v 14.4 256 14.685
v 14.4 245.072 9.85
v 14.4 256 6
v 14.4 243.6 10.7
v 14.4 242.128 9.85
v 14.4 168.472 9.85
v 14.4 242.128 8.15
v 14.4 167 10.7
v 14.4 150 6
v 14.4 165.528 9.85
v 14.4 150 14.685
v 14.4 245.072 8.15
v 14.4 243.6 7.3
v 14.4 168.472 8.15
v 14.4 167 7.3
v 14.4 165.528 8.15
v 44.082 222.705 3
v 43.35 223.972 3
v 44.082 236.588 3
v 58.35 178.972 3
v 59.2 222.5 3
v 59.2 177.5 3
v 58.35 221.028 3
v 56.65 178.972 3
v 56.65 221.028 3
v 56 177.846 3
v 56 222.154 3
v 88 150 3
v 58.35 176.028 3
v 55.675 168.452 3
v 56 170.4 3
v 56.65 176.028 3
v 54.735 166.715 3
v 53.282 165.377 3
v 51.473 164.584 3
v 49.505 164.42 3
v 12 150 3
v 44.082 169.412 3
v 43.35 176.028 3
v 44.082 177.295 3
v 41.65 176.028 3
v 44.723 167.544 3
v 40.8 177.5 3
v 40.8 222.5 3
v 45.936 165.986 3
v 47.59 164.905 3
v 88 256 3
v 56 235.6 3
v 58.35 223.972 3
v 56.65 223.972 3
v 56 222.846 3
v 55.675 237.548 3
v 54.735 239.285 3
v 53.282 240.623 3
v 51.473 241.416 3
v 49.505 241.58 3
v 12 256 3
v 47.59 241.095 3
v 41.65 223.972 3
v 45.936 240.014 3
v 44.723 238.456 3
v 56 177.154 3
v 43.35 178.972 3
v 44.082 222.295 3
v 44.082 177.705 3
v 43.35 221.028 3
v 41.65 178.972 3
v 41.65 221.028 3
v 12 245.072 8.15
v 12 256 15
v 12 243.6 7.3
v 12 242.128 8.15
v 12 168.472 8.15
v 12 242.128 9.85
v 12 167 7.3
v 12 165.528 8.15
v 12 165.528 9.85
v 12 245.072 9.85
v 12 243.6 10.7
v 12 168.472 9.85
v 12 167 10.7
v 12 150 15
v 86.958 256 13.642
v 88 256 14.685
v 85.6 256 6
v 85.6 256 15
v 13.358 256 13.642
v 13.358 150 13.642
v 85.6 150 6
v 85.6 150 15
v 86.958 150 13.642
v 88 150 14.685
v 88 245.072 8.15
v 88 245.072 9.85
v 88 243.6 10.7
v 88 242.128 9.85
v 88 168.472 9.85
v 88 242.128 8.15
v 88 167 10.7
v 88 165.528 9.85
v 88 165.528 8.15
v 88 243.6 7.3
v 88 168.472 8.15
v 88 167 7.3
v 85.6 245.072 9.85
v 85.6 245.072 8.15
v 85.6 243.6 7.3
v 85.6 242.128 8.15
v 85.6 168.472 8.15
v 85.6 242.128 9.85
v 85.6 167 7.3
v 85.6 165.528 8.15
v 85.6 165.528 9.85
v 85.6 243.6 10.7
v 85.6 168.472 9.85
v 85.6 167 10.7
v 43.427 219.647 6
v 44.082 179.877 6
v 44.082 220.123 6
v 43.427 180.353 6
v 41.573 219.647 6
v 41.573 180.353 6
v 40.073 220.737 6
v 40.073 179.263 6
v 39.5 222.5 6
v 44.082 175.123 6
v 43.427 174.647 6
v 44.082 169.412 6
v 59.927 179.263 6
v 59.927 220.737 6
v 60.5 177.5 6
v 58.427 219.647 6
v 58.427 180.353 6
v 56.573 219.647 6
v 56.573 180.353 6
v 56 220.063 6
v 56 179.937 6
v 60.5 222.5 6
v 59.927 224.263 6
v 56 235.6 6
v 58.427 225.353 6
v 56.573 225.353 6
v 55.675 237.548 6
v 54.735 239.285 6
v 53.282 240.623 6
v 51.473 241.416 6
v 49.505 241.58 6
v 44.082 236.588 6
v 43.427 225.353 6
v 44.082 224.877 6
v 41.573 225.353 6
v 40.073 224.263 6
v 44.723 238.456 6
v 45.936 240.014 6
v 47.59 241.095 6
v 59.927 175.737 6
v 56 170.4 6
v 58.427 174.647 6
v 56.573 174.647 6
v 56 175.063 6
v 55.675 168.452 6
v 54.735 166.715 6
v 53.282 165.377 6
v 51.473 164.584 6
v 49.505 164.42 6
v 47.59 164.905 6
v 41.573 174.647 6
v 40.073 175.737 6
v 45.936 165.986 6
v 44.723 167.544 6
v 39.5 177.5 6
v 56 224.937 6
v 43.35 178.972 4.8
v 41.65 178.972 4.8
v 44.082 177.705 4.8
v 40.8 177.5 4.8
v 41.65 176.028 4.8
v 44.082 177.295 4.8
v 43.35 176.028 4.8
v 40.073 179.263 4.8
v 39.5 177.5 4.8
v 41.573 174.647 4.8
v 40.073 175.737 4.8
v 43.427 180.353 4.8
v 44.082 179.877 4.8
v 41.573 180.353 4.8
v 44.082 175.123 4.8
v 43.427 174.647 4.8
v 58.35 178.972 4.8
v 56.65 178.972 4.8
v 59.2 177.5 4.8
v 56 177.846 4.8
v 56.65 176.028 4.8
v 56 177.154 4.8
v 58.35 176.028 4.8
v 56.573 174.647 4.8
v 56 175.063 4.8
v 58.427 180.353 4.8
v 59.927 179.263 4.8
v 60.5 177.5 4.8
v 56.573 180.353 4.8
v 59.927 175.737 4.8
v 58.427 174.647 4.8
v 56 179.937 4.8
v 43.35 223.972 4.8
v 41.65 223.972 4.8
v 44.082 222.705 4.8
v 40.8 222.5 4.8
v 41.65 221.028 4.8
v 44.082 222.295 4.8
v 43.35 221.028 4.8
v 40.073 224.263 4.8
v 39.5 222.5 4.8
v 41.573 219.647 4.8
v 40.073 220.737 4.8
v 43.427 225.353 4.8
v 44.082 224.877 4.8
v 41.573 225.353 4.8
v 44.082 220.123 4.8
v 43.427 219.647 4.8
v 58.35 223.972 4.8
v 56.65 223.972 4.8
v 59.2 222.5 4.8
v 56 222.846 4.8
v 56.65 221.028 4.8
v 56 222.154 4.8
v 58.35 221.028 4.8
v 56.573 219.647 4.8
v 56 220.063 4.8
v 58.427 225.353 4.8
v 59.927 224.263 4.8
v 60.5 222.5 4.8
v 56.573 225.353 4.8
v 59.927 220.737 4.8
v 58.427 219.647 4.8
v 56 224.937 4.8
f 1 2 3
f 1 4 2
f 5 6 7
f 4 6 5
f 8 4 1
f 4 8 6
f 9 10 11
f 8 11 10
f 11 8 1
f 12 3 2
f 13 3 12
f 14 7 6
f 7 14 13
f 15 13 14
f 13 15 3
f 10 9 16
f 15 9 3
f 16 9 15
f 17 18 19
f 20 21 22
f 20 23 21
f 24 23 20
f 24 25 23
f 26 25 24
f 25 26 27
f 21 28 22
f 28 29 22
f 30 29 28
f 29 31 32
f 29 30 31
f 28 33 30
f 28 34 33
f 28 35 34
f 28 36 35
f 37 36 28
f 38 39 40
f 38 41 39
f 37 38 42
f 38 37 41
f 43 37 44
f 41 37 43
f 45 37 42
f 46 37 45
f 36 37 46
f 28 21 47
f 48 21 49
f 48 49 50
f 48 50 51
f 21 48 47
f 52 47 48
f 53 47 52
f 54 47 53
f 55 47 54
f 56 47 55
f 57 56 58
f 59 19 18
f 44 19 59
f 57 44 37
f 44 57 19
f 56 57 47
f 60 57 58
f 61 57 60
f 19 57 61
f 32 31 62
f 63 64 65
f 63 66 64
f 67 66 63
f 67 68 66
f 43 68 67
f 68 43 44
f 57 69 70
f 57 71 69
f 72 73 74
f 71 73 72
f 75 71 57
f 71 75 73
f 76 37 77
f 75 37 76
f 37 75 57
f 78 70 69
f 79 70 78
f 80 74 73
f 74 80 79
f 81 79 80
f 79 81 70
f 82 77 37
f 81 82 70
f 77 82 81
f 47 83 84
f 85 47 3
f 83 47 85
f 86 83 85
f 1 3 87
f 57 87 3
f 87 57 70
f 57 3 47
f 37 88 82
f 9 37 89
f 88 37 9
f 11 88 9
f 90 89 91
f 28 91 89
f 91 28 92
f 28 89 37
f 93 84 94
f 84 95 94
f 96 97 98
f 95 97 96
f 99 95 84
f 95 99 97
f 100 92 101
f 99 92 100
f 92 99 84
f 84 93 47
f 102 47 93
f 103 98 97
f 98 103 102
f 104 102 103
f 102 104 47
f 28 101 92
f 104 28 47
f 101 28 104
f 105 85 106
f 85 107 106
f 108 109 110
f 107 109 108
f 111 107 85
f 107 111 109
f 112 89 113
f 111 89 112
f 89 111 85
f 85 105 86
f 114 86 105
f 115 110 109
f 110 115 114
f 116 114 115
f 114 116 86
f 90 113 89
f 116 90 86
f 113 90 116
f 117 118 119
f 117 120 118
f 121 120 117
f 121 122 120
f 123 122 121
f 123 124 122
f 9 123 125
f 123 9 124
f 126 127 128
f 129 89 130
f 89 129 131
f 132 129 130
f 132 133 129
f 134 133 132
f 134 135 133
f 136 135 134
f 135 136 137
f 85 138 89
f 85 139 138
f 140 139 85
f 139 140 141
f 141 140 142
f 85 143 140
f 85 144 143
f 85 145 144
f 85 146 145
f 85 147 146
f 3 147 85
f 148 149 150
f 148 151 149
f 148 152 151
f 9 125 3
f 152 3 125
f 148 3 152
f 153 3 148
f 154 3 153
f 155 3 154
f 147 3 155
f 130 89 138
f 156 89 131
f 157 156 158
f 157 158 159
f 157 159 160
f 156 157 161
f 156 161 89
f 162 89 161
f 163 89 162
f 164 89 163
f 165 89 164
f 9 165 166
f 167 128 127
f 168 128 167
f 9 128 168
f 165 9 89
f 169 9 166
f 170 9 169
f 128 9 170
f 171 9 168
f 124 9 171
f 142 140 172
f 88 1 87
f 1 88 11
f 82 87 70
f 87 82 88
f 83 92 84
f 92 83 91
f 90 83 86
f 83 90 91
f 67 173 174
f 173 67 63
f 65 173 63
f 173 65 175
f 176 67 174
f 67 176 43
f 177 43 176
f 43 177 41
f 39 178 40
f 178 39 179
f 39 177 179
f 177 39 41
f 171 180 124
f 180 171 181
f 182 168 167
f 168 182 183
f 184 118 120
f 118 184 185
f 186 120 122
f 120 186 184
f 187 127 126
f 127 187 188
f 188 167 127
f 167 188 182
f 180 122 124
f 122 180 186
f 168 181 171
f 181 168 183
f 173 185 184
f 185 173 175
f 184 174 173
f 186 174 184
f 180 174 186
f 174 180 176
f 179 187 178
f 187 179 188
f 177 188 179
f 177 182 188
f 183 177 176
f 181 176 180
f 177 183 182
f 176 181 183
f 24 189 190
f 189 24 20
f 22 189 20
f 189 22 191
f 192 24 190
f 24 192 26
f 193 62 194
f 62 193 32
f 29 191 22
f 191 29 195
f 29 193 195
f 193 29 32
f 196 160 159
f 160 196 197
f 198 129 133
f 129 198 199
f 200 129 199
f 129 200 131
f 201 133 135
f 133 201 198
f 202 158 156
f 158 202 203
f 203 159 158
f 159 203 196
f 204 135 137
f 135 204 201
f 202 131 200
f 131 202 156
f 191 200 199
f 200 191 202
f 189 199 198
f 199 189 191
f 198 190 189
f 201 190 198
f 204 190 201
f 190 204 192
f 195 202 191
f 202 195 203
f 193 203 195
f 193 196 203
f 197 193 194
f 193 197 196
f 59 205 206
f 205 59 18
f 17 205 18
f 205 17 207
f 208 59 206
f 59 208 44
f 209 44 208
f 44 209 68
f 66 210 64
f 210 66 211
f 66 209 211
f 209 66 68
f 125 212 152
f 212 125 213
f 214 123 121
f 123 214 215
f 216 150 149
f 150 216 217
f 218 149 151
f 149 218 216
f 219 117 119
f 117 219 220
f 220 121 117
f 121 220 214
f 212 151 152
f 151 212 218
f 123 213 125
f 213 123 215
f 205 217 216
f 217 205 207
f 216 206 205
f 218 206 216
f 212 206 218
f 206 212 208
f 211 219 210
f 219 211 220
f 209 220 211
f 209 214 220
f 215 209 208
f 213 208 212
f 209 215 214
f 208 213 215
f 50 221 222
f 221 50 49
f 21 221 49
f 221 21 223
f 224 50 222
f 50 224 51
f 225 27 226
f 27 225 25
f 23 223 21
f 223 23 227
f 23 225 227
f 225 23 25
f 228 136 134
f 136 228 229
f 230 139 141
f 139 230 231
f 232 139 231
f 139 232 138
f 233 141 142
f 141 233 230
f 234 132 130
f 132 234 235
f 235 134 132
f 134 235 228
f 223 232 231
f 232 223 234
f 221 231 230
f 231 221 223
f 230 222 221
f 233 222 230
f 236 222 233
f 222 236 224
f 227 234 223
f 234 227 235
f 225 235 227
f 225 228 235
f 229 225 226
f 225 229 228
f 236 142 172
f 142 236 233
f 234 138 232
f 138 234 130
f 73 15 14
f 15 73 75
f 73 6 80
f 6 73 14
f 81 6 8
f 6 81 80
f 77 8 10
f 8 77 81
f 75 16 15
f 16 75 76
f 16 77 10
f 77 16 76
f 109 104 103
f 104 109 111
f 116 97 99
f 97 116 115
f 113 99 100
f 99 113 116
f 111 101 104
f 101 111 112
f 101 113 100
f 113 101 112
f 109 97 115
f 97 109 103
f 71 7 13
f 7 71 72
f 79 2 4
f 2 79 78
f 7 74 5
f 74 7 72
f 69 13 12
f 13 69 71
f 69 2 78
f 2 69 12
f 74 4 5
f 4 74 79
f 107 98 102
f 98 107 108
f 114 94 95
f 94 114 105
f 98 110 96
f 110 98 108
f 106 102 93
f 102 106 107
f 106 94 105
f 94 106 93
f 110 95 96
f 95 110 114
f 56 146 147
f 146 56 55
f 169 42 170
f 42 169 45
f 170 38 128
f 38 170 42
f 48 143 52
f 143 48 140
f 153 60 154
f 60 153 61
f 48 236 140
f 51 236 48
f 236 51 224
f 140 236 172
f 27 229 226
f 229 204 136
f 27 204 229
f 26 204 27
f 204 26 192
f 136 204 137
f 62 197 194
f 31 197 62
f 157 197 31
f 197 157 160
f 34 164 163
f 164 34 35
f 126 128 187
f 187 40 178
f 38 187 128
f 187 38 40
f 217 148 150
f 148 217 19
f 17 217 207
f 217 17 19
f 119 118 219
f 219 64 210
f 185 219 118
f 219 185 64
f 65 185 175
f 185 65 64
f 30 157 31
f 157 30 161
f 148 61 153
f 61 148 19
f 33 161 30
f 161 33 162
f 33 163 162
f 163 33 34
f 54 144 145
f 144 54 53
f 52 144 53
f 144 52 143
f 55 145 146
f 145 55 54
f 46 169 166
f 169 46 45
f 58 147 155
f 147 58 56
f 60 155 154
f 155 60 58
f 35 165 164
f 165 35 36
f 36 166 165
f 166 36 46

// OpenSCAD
// =====================================================================
// parts/ssd_cage.scad  ->  ssd_cage()   (OPTIONAL part #8)
//
// 2.5" SATA SSD/HDD tray for a JEITA-standard drive (SSD_L x SSD_W x SSD_H
// = 100 x 70 x 7mm). It bolts onto the common 15mm M3 heat-set grid on the
// baseplate, BESIDE the motherboard, so a boot/data SSD can ride inside the
// chassis. The drive drops into the tray flat-side-down and is retained by
// 4x M3 screws through the two long side walls into the drive's standard
// 2.5" side mounting holes.
//
// FROZEN CONTRACT — modeled in the GLOBAL ASSEMBLY FRAME:
//   Origin (0,0,0) = front-bottom-left interior corner of the chassis body.
//   +X width, +Y depth, +Z height (floor 0..FLOOR=3).
// main.scad unions this module with NO transform, so it is PRE-PLACED here
// at SSD_CAGE_POS=[12,150] and rests on the baseplate floor top (Z=FLOOR).
// Assembly region: ~105 x 75 x 16 (X,Y,Z).  Long axis of the drive runs in
// +Y (depth), so the 100mm drive length stays well clear of the board edge.
//
// Mounting / seams (from params.scad + contract):
//   - 4x M3 CLEARANCE feet through the tray floor land on the nearest 15mm
//     grid points so M3 screws pass DOWN into the baseplate grid inserts.
//     The cage itself takes NO inserts -> clearance holes only.
//   - SSD held by 4x M3 CLEARANCE holes through the side walls into the
//     drive's standard 2.5" side holes (positions are // MEASURE in params).
//
// Printability: flat largest-face-down (tray floor on the bed), no overhang
// >45deg (wall tops chamfered, drive-entry mouth chamfered), every vertical
// bore is a simple through-hole (no bridging over a blind insert), side
// retention holes are small horizontal bores that self-bridge in PETG.
// All // MEASURE values live ONLY in params.scad.
// =====================================================================

include <params.scad>
use <../lib/joinery.scad>

module ssd_cage() {
    // ---- resolved placement (assembly frame) ----------------------------
    ox    = SSD_CAGE_POS[0];      // cage origin X (~12)  // MEASURE
    oy    = SSD_CAGE_POS[1];      // cage origin Y (~150) // MEASURE
    z0    = FLOOR;                // tray floor bottom sits on the baseplate top (Z=3)

    // Drive footprint (JEITA 2.5"): length in +Y, width in +X.
    drv_l = SSD_L;                // 100 (Y, drive length)
    drv_w = SSD_W;               //  70 (X, drive width)
    drv_h = SSD_H;               //   7 (Z, drive height)

    // ---- tray geometry --------------------------------------------------
    floor_t  = 3;                 // tray floor thickness (Z)
    wall_t   = 2.4;               // side-wall thickness (X), 6 perimeters @0.4
    clr      = 0.6;               // drive-to-wall slip clearance (per side, X & Y)
    wall_h   = drv_h + 2;         // side-wall height above floor top (Z), 9mm
    chamf    = 1.2;               // top-edge + mouth chamfer (no >45deg overhang)

    // Inner pocket the drive drops into (drive + clearance on all sides).
    pocket_w = drv_w + 2*clr;     // X inner
    pocket_l = drv_l + 2*clr;     // Y inner

    // Outer tray shell footprint.
    outer_w  = pocket_w + 2*wall_t;   // X total (~76mm  -> well under 190)
    outer_l  = pocket_l + 2*wall_t;   // Y total (~106mm -> well under 190)

    // Tray inner-pocket corner (assembly frame): drive bottom rests on floor top.
    px0 = ox + wall_t;            // pocket X0
    py0 = oy + wall_t;            // pocket Y0
    pz0 = z0 + floor_t;           // pocket floor top Z (drive underside)

    // Tray outer corner (assembly frame).
    sx0 = ox;                     // shell X0
    sy0 = oy;                     // shell Y0
    sz0 = z0;                     // shell Z0 (on baseplate top)
    sz1 = z0 + floor_t + wall_h;  // shell top Z (~15mm above floor -> ~18 abs)

    // Drive center (assembly frame) for the side retention holes.
    drv_cx = px0 + pocket_w/2;    // = drive center X
    drv_y0 = py0 + clr;           // drive front face Y (inside pocket)

    // ---- 4x M3 floor feet: nearest 15mm grid points ---------------------
    // The tray must bolt to REAL grid bosses. Pick the two grid columns and
    // two grid rows that fall INSIDE the floor footprint with an M3 edge
    // margin, straddling the tray center, so all 4 screws land on the grid.
    foot_margin = M3_CLEAR/2 + 2.0;                  // wall around an M3 hole
    cx_mid = sx0 + outer_w/2;                         // tray center X
    cy_mid = sy0 + outer_l/2;                         // tray center Y
    // grid column straddle around tray center X
    gx_lo = GRID_X0 + GRID_PITCH * floor((cx_mid - GRID_X0)/GRID_PITCH);
    gx_hi = gx_lo + GRID_PITCH;
    // grid rows straddle around tray center Y (use a wider span for stability)
    gy_lo = GRID_Y0 + GRID_PITCH * floor((cy_mid - GRID_Y0)/GRID_PITCH - 1);
    gy_hi = GRID_Y0 + GRID_PITCH * ceil ((cy_mid - GRID_Y0)/GRID_PITCH + 1);
    foot_pts = [ [gx_lo, gy_lo], [gx_hi, gy_lo],
                 [gx_lo, gy_hi], [gx_hi, gy_hi] ];   // 4x M3 clearance // MEASURE

    // ---- 4x M3 side retention holes (drive's standard 2.5" side holes) ---
    // JEITA 2.5": side mounting holes lie on the drive's long sides, axis
    // along the drive WIDTH (here = +X). Standard set is 4 holes, 2 per side,
    // at a longitudinal spacing along the drive length and a fixed height of
    // ~3.0mm above the drive bottom. All positions below are // MEASURE.
    side_hole_z   = pz0 + 3.0;                    // 3.0mm above drive bottom // MEASURE
    // longitudinal (Y) hole centers along the drive, from the drive front:
    side_y_near   = drv_y0 + 14.0;                // // MEASURE
    side_y_far    = drv_y0 + 90.6;                // // MEASURE (JEITA span ~76.6)
    side_ys       = [ side_y_near, side_y_far ];

    difference() {
        union() {
            // ---- tray shell: floor + two long side walls ----------------
            // (Open front/rear ends ease drive insertion and let the SATA
            //  connector breathe; the two long walls carry the retention
            //  screws and brace the drive.)
            // floor slab
            translate([sx0, sy0, sz0])
                cube([outer_w, outer_l, floor_t]);

            // left + right side walls (full tray length in Y)
            for (wx = [ sx0, sx0 + outer_w - wall_t ])
                translate([wx, sy0, sz0])
                    cube([wall_t, outer_l, floor_t + wall_h]);
        }

        // ---- top-edge chamfers on the side walls (no >45deg overhang on
        //      the outer top corners; cosmetic + deburring) ----------------
        for (s = [0, 1]) {
            wx = (s == 0) ? sx0 : sx0 + outer_w;     // outer wall face X
            sgn = (s == 0) ? 1 : -1;                  // cut toward inside
            translate([wx, sy0 - EPS, sz1])
                rotate([0, 45, 0])
                    translate([0, 0, 0])
                        cube([chamf*1.6, outer_l + 2*EPS, chamf*1.6]);
        }

        // ---- drive-entry mouth chamfer at the wall inner-top edges -------
        // 45deg lead-in on the inner-top of each side wall so the drive
        // slides in; printed face stays <=45deg (overhang ramps inward+down).
        for (s = [0, 1]) {
            ix = (s == 0) ? px0 : px0 + pocket_w;    // inner wall face X
            translate([ix, sy0 - EPS, sz1])
                rotate([0, 45, 0])
                    cube([chamf*1.6, outer_l + 2*EPS, chamf*1.6], center = false);
        }

        // ---- 4x M3 floor feet (clearance, axis +Z, through floor) -------
        // Counterbored from the TOP so the screw head sits flush-ish and does
        // not foul the drive; counterbore is shallow and OPENS UPWARD (the
        // through-hole is fully open below it -> no bridging).
        for (p = foot_pts) {
            // through clearance hole
            translate([p[0], p[1], sz0 - EPS])
                cylinder(h = floor_t + 2*EPS, d = M3_CLEAR);
            // shallow head counterbore from the floor top (opens up)
            translate([p[0], p[1], sz0 + floor_t - 1.2])
                cylinder(h = 1.2 + EPS, d = M3_HEAD_D);
        }

        // ---- 4x M3 side retention holes (axis +X, through both walls) ----
        for (sy = side_ys) {
            // left wall hole
            translate([sx0 - EPS, sy, side_hole_z])
                rotate([0, 90, 0])
                    cylinder(h = wall_t + 2*EPS, d = M3_CLEAR);
            // right wall hole
            translate([sx0 + outer_w - wall_t - EPS, sy, side_hole_z])
                rotate([0, 90, 0])
                    cylinder(h = wall_t + 2*EPS, d = M3_CLEAR);
        }

        // ---- floor lightening / airflow + cable-relief slot -------------
        // A central longitudinal slot under the drive saves plastic and lets
        // SATA cabling pass; kept inboard of all 4 feet so it never breaks a
        // bolt land. Rounded ends (hull of two cylinders) -> clean manifold.
        slot_w  = 12;                                  // slot width (X)
        slot_y0 = py0 + 18;                            // start inboard of feet
        slot_y1 = py0 + pocket_l - 18;                 // end inboard of feet
        translate([0, 0, sz0 - EPS])
            linear_extrude(height = floor_t + 2*EPS)
                hull() {
                    translate([cx_mid, slot_y0]) circle(d = slot_w);
                    translate([cx_mid, slot_y1]) circle(d = slot_w);
                }
    }
}

// standalone render
ssd_cage();
